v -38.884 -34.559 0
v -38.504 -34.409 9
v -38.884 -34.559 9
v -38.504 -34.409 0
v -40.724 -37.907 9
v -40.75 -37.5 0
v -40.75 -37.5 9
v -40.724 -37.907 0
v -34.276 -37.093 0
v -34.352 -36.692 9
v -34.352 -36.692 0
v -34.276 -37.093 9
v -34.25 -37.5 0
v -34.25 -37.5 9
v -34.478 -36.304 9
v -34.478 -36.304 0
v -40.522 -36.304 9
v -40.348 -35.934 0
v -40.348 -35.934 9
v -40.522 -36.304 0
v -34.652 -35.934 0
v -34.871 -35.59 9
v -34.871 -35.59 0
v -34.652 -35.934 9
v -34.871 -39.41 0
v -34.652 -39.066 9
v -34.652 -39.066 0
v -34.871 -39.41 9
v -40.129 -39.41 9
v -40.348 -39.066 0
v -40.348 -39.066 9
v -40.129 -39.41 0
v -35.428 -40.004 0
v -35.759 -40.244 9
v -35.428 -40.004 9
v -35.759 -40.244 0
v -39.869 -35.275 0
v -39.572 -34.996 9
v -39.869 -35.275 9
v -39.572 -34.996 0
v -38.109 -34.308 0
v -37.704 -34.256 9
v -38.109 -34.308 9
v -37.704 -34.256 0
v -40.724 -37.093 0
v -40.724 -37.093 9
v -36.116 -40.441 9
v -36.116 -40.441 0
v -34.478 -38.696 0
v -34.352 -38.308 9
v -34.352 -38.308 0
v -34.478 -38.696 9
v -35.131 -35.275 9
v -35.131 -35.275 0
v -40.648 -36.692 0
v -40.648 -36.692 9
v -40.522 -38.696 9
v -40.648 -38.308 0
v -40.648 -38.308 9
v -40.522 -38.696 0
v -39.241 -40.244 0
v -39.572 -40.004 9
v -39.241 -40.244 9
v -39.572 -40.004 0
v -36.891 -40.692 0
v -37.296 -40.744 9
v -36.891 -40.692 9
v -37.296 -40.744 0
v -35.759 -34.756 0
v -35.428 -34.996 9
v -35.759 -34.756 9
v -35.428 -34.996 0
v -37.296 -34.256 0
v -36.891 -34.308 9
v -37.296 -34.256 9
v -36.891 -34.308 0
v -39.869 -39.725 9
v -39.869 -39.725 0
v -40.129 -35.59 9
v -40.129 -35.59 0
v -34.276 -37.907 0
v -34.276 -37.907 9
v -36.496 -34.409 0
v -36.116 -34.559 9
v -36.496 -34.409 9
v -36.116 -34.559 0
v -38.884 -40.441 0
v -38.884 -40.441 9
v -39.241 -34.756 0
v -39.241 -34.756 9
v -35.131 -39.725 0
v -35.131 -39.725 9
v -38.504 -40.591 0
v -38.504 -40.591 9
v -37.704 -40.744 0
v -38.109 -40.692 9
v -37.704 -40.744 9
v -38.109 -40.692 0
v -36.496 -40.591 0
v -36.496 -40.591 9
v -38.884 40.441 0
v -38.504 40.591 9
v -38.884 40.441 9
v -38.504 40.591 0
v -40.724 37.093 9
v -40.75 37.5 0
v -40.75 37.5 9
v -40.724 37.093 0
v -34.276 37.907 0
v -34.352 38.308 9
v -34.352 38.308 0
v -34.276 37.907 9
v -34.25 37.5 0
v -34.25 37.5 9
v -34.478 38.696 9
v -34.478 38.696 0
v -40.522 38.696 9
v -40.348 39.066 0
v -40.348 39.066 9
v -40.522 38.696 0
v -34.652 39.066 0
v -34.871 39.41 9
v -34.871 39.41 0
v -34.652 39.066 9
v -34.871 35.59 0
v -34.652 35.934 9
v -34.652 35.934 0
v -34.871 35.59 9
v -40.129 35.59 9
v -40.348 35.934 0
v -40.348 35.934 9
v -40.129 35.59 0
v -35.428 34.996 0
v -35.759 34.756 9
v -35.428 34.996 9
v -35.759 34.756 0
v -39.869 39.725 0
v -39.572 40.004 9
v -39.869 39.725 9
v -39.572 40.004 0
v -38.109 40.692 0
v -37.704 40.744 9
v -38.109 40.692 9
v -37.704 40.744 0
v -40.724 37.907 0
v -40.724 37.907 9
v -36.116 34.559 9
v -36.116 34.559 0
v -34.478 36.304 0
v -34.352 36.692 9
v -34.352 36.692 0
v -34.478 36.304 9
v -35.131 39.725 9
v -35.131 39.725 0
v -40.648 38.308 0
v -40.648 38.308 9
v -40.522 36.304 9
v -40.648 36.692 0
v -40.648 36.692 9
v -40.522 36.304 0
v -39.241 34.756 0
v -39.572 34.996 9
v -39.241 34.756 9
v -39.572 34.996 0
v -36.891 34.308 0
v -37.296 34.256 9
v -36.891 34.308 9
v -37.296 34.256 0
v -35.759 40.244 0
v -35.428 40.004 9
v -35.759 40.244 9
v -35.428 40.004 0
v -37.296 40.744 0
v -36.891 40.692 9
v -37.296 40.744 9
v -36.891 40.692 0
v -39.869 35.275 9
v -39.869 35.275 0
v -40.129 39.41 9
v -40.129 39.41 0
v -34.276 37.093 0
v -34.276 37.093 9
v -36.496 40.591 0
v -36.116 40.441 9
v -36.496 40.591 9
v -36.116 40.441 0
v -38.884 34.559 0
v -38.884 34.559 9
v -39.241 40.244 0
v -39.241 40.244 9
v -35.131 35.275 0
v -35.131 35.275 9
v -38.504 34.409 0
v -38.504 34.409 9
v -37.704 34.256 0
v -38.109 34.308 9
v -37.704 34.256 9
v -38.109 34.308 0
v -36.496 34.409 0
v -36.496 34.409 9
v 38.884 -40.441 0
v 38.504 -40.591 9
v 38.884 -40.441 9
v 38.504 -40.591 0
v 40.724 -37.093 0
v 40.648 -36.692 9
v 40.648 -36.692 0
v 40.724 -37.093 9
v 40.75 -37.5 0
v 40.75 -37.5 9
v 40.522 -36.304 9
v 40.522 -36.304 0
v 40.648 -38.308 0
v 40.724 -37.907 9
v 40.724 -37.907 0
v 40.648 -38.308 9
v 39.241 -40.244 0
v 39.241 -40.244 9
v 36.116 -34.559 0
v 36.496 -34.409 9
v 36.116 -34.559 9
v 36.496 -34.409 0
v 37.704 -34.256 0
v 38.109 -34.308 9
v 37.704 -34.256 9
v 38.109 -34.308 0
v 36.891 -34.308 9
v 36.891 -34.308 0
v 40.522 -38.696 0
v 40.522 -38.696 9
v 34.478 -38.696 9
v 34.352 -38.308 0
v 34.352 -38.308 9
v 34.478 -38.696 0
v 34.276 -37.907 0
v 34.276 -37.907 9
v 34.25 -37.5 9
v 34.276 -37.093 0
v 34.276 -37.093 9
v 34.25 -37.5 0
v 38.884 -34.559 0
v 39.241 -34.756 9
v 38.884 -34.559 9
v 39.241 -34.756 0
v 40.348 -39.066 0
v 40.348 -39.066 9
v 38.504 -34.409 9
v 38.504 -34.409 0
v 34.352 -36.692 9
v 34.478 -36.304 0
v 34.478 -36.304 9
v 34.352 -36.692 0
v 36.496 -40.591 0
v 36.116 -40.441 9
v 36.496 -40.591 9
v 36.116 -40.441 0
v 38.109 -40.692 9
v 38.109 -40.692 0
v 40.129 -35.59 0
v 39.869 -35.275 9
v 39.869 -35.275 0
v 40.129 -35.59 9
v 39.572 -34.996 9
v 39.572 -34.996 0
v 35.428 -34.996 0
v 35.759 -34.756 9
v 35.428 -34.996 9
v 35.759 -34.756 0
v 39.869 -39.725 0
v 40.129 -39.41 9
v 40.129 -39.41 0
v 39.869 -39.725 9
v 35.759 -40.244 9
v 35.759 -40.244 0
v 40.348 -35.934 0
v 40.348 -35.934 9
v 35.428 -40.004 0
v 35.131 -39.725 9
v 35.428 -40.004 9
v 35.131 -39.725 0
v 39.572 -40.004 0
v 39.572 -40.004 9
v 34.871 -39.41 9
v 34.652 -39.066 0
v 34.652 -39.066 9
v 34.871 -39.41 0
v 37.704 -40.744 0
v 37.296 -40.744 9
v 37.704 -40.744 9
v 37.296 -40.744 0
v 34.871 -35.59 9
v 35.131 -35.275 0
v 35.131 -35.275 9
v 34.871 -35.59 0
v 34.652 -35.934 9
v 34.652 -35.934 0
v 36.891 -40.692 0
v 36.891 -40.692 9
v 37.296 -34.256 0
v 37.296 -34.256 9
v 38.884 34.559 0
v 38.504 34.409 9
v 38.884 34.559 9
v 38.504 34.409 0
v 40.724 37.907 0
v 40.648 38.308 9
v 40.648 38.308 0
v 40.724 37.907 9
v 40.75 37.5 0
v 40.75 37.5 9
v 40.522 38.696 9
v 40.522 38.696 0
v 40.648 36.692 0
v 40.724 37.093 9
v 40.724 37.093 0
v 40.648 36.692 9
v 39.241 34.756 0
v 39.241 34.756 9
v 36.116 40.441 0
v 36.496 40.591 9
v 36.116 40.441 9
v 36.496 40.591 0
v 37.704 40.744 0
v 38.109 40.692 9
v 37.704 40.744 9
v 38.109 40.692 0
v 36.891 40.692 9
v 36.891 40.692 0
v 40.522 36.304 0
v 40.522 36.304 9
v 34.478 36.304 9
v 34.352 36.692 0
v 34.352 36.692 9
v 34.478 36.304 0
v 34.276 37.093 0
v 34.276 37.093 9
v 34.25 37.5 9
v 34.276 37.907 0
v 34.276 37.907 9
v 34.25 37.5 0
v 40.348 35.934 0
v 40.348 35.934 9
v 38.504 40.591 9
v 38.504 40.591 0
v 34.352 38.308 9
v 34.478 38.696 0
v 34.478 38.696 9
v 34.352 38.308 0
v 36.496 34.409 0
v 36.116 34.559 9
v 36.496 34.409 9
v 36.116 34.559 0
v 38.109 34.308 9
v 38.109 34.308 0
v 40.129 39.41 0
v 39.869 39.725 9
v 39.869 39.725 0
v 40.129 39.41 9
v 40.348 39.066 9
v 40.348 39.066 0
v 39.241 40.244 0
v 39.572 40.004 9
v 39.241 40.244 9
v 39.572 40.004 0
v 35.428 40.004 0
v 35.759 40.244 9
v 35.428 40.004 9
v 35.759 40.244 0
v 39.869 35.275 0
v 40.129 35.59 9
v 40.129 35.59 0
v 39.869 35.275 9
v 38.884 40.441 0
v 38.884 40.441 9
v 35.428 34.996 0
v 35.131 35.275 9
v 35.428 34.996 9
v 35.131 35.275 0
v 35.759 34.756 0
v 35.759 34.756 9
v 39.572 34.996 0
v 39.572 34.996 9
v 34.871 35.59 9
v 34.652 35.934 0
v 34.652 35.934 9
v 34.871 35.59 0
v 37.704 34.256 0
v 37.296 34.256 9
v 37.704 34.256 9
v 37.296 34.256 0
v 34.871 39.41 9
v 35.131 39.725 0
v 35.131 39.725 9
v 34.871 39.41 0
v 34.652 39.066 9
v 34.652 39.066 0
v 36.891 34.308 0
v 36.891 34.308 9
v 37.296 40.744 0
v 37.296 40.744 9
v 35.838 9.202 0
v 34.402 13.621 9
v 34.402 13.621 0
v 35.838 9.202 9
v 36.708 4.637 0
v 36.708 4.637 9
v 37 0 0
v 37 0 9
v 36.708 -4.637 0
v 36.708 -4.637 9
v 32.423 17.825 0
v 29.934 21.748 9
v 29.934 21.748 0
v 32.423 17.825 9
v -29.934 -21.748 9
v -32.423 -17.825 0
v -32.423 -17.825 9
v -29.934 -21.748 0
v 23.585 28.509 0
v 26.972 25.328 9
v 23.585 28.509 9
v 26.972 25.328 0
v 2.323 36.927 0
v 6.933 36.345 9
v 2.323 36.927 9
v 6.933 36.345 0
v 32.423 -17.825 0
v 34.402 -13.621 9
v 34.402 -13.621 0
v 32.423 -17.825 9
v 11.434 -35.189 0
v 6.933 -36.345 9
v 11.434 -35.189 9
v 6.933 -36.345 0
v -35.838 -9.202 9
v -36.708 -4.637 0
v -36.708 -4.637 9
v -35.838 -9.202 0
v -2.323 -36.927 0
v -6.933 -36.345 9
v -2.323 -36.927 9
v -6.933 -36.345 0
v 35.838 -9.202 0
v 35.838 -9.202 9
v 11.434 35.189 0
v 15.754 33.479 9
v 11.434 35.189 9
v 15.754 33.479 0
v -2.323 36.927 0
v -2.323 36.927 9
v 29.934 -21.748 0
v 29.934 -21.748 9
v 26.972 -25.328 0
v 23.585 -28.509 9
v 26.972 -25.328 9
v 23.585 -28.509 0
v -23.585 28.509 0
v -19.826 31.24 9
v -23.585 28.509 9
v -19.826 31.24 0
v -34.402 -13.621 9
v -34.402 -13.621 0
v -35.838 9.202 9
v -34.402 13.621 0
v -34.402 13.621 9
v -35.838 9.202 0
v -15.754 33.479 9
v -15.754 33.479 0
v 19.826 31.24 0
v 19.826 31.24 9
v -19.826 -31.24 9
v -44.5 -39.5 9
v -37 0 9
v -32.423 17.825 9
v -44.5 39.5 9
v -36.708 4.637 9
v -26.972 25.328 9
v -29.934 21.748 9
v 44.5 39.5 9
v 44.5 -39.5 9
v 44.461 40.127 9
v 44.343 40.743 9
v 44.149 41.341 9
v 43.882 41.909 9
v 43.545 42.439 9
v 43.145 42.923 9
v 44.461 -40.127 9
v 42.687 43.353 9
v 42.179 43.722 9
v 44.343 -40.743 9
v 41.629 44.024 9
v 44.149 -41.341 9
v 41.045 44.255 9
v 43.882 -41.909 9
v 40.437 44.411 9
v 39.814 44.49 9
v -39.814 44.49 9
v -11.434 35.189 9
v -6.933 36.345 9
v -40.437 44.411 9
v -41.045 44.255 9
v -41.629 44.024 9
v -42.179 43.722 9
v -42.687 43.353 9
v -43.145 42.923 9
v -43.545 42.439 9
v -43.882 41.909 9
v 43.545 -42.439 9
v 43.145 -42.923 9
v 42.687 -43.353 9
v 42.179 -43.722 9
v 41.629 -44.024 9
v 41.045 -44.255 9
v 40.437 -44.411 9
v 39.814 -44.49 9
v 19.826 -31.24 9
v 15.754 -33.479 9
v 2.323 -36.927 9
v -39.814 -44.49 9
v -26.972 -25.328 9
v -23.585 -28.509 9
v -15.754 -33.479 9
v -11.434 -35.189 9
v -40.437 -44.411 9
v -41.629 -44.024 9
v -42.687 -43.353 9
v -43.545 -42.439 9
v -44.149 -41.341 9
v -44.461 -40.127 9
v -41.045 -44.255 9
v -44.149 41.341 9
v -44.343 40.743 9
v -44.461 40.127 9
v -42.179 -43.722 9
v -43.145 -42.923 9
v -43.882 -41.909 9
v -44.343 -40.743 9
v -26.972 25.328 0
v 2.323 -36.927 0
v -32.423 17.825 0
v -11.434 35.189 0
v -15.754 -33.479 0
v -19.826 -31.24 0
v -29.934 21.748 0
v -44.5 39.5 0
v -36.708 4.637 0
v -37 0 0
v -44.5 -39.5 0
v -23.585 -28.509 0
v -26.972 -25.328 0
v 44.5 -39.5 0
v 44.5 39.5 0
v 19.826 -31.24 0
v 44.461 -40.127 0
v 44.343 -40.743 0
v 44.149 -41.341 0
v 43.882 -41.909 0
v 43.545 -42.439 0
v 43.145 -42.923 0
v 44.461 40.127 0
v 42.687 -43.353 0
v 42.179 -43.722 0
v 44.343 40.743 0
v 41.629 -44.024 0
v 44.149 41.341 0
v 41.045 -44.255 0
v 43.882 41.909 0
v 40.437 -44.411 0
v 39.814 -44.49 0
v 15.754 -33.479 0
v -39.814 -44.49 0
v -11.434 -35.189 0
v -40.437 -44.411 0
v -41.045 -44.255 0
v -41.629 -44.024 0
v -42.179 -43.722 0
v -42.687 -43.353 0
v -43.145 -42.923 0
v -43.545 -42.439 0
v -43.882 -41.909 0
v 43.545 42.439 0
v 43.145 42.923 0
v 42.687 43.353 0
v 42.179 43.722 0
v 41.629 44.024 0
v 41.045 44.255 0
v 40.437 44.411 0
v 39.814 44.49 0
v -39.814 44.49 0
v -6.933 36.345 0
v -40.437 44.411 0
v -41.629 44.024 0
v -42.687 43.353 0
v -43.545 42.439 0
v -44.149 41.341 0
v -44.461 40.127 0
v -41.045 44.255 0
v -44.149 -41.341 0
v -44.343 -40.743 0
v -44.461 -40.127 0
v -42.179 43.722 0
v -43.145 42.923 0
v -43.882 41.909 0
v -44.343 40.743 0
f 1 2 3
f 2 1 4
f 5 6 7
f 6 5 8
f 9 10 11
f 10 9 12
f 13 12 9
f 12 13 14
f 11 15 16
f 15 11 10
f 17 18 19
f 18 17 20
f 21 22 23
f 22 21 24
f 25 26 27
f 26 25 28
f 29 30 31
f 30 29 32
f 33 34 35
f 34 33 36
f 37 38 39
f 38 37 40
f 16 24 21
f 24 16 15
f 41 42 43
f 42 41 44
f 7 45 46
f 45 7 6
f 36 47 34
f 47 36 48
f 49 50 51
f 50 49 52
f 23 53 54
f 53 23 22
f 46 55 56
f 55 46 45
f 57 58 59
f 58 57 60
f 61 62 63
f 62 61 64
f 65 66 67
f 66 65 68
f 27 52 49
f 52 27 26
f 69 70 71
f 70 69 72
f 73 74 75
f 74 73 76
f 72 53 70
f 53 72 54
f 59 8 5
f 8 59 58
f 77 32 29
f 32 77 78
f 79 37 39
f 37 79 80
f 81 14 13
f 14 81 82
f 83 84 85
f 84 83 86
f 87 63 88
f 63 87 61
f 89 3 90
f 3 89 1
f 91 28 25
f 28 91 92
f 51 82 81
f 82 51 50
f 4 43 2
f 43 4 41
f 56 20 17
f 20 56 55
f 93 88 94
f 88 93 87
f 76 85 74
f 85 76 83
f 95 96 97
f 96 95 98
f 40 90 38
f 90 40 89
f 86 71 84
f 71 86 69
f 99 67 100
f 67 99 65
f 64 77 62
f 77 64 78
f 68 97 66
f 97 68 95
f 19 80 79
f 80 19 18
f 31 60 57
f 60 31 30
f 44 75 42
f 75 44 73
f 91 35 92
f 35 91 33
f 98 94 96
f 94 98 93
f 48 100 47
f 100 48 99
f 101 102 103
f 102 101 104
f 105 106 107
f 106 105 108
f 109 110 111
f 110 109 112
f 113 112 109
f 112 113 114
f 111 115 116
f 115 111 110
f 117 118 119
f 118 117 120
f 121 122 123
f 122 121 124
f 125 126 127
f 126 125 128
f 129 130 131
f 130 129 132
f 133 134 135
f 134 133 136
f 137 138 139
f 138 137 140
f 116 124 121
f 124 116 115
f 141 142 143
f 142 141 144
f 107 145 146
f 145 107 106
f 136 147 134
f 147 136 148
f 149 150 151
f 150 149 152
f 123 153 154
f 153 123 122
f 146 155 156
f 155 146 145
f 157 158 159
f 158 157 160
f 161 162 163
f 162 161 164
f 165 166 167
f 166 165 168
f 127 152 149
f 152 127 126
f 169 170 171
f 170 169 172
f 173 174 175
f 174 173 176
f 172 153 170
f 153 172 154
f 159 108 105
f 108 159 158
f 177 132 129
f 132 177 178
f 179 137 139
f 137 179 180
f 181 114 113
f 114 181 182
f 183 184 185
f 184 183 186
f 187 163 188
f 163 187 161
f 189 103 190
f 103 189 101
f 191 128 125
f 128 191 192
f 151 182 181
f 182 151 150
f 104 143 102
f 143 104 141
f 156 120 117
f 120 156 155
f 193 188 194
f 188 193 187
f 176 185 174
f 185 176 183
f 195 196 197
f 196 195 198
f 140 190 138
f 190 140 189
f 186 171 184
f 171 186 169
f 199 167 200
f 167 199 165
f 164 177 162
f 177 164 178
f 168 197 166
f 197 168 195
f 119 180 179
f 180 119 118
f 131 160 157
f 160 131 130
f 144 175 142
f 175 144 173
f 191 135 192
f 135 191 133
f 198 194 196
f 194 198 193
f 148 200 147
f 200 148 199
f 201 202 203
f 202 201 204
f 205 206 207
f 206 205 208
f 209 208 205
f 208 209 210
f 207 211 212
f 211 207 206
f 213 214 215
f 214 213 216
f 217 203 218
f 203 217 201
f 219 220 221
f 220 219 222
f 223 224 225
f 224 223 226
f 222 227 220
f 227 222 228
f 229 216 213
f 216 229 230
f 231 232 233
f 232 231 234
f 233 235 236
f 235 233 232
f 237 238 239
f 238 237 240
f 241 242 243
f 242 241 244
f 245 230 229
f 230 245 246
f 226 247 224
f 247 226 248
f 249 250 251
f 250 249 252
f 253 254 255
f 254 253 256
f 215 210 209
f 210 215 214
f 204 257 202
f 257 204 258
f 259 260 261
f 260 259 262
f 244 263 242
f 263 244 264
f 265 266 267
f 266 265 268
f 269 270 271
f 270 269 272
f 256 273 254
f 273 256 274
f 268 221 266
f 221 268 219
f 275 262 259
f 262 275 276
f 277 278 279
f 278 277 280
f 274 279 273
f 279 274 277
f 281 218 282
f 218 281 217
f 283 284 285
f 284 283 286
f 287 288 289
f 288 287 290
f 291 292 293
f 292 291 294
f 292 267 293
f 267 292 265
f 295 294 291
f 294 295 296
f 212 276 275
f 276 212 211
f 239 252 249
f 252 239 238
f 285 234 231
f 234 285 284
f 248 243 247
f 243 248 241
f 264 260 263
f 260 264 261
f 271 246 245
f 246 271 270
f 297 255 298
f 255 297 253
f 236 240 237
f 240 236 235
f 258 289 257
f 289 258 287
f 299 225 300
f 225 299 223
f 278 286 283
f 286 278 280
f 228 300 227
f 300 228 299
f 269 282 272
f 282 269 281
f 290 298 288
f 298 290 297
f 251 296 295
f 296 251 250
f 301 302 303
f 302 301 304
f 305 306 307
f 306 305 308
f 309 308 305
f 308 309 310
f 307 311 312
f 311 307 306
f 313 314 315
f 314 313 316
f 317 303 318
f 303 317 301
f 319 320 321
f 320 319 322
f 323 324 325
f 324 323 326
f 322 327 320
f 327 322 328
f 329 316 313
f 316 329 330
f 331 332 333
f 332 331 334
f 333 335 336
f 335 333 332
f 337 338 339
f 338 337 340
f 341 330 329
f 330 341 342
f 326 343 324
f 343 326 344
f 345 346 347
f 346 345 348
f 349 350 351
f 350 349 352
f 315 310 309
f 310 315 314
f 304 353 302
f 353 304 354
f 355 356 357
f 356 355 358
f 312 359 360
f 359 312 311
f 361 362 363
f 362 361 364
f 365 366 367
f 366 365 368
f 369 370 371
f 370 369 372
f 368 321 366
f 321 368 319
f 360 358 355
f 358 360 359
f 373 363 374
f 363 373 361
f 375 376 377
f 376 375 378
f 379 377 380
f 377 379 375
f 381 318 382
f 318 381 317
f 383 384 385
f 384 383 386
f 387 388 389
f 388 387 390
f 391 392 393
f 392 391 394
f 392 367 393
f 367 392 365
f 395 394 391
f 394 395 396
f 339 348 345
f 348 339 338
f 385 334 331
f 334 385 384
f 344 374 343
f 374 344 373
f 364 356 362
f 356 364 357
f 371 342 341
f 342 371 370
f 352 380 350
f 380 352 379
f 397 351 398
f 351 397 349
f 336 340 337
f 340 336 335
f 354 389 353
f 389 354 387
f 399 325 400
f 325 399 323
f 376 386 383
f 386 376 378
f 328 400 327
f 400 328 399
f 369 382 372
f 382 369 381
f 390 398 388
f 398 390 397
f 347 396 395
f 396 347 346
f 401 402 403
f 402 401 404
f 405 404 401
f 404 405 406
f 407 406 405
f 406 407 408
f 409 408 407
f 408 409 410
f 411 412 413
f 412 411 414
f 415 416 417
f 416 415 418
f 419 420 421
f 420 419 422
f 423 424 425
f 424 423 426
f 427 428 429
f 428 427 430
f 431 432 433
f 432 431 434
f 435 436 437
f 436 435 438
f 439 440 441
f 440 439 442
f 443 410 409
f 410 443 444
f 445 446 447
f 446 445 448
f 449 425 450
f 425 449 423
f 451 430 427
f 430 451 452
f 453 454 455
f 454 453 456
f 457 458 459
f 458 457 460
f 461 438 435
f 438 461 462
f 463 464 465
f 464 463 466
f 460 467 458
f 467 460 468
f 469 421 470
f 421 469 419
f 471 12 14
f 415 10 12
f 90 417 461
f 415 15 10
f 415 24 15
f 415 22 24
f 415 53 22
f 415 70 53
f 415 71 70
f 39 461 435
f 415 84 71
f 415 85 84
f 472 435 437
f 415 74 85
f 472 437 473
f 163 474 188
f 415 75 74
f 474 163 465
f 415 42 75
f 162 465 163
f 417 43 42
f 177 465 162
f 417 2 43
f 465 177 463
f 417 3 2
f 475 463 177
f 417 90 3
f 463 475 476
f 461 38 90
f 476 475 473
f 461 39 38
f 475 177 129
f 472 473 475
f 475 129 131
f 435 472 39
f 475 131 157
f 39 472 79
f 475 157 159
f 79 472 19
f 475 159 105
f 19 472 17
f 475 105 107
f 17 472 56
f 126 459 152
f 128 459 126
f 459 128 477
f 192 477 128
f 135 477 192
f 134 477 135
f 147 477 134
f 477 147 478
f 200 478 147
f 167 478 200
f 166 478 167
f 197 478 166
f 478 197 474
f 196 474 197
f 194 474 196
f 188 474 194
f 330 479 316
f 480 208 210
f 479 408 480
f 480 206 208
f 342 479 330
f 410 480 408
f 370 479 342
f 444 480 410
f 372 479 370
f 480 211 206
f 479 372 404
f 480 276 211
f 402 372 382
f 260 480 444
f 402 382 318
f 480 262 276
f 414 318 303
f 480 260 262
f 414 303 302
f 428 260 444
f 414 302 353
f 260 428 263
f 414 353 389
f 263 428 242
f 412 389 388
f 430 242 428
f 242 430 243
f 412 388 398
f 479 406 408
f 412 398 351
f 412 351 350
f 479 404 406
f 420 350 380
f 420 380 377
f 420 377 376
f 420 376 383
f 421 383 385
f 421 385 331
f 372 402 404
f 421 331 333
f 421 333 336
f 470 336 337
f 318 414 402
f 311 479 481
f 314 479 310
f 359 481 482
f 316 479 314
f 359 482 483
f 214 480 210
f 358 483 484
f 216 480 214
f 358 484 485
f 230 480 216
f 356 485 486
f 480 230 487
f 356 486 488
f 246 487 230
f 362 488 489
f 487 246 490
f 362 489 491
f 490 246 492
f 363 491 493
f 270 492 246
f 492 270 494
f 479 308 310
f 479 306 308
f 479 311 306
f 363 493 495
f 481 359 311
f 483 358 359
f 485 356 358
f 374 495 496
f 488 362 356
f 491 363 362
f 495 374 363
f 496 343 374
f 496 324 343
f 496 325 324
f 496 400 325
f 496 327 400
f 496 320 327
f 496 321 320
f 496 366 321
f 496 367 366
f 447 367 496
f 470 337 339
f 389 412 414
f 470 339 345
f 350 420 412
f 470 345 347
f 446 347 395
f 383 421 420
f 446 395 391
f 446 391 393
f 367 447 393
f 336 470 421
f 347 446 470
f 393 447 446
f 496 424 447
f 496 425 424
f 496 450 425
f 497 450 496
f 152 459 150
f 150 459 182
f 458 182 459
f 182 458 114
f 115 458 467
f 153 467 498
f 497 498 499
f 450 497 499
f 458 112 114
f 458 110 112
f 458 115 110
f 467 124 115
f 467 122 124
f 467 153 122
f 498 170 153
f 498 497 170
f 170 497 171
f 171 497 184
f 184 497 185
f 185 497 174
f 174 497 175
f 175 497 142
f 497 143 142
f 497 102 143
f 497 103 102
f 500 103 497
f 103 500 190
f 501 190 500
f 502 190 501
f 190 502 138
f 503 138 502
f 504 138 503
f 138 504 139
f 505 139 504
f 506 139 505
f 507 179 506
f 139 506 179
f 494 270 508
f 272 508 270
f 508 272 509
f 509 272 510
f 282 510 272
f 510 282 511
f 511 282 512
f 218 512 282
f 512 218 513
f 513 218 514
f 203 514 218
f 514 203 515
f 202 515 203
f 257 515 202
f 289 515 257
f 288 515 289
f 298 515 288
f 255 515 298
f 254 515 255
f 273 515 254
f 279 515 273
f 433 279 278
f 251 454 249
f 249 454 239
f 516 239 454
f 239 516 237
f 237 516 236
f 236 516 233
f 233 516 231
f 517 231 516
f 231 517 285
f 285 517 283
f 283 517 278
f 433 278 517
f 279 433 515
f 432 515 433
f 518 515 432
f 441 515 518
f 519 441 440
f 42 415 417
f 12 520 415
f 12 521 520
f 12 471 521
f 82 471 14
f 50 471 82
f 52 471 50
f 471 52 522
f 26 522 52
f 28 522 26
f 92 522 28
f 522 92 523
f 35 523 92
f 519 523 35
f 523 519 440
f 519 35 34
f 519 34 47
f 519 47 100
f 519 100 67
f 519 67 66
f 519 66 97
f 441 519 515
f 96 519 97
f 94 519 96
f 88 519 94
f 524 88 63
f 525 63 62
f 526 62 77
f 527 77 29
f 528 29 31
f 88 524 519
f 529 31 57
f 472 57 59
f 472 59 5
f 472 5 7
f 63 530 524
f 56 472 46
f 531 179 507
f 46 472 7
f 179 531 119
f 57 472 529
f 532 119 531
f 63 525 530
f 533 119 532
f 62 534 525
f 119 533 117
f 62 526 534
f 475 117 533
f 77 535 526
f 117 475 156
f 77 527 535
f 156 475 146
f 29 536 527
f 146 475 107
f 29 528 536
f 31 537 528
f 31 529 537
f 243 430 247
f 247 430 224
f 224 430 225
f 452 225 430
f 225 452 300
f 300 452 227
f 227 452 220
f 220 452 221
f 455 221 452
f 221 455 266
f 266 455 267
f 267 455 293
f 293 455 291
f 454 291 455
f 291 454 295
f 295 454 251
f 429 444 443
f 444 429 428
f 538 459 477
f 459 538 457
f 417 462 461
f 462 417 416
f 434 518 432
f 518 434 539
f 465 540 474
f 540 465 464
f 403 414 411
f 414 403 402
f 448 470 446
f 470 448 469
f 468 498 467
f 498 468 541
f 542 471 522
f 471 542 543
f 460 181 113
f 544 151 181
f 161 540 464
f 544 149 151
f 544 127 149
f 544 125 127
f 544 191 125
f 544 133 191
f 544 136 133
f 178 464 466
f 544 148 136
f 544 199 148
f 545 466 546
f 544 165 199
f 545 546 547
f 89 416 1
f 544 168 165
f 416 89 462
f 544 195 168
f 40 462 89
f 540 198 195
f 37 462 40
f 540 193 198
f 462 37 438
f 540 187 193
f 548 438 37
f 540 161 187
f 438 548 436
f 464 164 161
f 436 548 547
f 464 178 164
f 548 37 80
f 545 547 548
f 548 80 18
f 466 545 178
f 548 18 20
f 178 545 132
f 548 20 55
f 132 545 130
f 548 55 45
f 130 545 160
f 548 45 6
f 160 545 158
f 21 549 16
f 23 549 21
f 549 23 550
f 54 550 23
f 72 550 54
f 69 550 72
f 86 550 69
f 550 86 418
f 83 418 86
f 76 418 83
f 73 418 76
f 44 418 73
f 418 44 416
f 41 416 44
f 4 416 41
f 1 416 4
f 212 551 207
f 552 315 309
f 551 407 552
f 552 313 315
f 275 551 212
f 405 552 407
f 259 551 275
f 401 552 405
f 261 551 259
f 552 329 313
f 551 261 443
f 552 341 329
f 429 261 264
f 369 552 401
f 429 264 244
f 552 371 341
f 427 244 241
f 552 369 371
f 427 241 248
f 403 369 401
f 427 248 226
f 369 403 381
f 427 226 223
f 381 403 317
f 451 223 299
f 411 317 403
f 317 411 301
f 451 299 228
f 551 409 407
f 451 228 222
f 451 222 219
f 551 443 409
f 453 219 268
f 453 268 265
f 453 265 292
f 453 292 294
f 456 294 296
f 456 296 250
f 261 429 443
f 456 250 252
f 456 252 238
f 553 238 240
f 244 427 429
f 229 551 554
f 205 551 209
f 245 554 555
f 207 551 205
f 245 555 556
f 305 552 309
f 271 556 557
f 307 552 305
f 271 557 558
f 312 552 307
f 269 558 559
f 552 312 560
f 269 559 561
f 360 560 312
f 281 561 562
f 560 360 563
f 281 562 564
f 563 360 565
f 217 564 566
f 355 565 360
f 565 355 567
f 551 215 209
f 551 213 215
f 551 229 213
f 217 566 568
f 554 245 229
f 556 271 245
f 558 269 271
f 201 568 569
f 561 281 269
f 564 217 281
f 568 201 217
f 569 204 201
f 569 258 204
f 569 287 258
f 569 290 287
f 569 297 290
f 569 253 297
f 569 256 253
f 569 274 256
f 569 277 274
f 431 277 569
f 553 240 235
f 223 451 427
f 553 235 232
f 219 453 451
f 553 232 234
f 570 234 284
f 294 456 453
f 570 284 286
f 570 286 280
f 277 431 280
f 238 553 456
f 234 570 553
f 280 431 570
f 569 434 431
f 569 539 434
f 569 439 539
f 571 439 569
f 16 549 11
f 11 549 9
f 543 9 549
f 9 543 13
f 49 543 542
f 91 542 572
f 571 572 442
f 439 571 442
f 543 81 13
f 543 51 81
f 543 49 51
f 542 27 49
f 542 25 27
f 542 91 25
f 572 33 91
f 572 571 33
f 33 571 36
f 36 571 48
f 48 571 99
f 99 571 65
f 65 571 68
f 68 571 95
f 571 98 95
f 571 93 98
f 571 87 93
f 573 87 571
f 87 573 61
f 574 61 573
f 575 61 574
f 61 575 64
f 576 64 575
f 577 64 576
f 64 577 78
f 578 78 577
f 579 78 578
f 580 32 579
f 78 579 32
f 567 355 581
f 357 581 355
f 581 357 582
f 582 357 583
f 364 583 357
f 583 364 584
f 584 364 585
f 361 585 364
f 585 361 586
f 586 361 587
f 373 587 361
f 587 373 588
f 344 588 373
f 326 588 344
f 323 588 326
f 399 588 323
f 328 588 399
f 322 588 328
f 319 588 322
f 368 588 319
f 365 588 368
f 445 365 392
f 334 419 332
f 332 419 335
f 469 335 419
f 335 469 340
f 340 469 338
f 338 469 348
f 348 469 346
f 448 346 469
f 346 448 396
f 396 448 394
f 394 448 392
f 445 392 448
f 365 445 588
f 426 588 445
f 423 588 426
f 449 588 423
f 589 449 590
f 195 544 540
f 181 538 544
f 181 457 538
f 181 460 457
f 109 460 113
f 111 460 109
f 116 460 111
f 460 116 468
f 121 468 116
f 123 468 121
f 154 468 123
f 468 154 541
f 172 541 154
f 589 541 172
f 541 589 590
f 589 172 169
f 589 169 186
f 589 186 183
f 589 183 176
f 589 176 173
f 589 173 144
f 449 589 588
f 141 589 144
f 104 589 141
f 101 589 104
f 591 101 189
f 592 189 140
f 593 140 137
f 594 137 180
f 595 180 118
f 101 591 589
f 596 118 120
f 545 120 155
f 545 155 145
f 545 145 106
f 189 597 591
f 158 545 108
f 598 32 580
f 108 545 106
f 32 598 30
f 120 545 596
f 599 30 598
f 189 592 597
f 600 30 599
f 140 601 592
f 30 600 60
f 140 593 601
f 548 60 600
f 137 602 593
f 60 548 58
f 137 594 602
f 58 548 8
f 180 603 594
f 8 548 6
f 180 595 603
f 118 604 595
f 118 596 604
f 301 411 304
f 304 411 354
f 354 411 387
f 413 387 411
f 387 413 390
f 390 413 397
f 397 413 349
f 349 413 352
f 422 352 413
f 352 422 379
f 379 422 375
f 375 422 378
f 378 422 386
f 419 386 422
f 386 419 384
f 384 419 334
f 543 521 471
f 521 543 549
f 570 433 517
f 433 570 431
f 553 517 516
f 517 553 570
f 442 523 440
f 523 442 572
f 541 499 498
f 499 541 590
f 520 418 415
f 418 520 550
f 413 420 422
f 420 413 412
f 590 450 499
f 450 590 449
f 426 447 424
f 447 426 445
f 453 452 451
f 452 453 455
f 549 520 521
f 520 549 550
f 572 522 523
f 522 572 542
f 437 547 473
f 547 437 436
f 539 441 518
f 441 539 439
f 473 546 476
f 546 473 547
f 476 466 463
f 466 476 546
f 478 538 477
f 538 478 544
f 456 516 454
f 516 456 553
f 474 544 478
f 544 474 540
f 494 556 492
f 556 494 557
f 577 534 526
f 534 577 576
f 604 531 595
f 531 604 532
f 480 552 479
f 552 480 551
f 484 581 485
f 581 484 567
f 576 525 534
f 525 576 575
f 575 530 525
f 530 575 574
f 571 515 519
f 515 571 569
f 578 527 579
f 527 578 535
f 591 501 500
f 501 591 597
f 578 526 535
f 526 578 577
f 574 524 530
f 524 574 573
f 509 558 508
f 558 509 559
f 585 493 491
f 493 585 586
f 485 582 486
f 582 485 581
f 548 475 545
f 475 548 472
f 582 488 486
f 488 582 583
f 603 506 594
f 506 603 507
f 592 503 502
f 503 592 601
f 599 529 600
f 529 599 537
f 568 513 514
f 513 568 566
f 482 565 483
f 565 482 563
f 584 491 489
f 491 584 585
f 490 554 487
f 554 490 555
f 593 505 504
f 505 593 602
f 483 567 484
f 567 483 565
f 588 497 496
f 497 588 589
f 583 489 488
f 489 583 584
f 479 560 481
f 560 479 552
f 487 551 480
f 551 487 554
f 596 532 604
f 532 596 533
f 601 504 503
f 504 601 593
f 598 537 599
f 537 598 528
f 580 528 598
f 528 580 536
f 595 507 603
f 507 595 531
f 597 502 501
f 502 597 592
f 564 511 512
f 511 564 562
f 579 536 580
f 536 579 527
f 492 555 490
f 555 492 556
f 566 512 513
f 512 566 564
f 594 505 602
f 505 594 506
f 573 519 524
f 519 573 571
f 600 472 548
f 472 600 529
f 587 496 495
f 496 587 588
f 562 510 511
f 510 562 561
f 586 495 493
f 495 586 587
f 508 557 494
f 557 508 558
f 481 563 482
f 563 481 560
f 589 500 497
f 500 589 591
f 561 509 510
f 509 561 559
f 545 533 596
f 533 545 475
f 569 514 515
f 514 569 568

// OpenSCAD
$fn = 50;


difference() {
	union() {
		hull() {
			translate(v = [-39.5000000000, 39.5000000000, 0]) {
				cylinder(h = 9, r = 5);
			}
			translate(v = [39.5000000000, 39.5000000000, 0]) {
				cylinder(h = 9, r = 5);
			}
			translate(v = [-39.5000000000, -39.5000000000, 0]) {
				cylinder(h = 9, r = 5);
			}
			translate(v = [39.5000000000, -39.5000000000, 0]) {
				cylinder(h = 9, r = 5);
			}
		}
	}
	union() {
		#translate(v = [-37.5000000000, -37.5000000000, -100.0000000000]) {
			cylinder(h = 200, r = 3.2500000000);
		}
		#translate(v = [-37.5000000000, 37.5000000000, -100.0000000000]) {
			cylinder(h = 200, r = 3.2500000000);
		}
		#translate(v = [37.5000000000, -37.5000000000, -100.0000000000]) {
			cylinder(h = 200, r = 3.2500000000);
		}
		#translate(v = [37.5000000000, 37.5000000000, -100.0000000000]) {
			cylinder(h = 200, r = 3.2500000000);
		}
		#cylinder(h = 9, r = 37.0000000000);
	}
}
